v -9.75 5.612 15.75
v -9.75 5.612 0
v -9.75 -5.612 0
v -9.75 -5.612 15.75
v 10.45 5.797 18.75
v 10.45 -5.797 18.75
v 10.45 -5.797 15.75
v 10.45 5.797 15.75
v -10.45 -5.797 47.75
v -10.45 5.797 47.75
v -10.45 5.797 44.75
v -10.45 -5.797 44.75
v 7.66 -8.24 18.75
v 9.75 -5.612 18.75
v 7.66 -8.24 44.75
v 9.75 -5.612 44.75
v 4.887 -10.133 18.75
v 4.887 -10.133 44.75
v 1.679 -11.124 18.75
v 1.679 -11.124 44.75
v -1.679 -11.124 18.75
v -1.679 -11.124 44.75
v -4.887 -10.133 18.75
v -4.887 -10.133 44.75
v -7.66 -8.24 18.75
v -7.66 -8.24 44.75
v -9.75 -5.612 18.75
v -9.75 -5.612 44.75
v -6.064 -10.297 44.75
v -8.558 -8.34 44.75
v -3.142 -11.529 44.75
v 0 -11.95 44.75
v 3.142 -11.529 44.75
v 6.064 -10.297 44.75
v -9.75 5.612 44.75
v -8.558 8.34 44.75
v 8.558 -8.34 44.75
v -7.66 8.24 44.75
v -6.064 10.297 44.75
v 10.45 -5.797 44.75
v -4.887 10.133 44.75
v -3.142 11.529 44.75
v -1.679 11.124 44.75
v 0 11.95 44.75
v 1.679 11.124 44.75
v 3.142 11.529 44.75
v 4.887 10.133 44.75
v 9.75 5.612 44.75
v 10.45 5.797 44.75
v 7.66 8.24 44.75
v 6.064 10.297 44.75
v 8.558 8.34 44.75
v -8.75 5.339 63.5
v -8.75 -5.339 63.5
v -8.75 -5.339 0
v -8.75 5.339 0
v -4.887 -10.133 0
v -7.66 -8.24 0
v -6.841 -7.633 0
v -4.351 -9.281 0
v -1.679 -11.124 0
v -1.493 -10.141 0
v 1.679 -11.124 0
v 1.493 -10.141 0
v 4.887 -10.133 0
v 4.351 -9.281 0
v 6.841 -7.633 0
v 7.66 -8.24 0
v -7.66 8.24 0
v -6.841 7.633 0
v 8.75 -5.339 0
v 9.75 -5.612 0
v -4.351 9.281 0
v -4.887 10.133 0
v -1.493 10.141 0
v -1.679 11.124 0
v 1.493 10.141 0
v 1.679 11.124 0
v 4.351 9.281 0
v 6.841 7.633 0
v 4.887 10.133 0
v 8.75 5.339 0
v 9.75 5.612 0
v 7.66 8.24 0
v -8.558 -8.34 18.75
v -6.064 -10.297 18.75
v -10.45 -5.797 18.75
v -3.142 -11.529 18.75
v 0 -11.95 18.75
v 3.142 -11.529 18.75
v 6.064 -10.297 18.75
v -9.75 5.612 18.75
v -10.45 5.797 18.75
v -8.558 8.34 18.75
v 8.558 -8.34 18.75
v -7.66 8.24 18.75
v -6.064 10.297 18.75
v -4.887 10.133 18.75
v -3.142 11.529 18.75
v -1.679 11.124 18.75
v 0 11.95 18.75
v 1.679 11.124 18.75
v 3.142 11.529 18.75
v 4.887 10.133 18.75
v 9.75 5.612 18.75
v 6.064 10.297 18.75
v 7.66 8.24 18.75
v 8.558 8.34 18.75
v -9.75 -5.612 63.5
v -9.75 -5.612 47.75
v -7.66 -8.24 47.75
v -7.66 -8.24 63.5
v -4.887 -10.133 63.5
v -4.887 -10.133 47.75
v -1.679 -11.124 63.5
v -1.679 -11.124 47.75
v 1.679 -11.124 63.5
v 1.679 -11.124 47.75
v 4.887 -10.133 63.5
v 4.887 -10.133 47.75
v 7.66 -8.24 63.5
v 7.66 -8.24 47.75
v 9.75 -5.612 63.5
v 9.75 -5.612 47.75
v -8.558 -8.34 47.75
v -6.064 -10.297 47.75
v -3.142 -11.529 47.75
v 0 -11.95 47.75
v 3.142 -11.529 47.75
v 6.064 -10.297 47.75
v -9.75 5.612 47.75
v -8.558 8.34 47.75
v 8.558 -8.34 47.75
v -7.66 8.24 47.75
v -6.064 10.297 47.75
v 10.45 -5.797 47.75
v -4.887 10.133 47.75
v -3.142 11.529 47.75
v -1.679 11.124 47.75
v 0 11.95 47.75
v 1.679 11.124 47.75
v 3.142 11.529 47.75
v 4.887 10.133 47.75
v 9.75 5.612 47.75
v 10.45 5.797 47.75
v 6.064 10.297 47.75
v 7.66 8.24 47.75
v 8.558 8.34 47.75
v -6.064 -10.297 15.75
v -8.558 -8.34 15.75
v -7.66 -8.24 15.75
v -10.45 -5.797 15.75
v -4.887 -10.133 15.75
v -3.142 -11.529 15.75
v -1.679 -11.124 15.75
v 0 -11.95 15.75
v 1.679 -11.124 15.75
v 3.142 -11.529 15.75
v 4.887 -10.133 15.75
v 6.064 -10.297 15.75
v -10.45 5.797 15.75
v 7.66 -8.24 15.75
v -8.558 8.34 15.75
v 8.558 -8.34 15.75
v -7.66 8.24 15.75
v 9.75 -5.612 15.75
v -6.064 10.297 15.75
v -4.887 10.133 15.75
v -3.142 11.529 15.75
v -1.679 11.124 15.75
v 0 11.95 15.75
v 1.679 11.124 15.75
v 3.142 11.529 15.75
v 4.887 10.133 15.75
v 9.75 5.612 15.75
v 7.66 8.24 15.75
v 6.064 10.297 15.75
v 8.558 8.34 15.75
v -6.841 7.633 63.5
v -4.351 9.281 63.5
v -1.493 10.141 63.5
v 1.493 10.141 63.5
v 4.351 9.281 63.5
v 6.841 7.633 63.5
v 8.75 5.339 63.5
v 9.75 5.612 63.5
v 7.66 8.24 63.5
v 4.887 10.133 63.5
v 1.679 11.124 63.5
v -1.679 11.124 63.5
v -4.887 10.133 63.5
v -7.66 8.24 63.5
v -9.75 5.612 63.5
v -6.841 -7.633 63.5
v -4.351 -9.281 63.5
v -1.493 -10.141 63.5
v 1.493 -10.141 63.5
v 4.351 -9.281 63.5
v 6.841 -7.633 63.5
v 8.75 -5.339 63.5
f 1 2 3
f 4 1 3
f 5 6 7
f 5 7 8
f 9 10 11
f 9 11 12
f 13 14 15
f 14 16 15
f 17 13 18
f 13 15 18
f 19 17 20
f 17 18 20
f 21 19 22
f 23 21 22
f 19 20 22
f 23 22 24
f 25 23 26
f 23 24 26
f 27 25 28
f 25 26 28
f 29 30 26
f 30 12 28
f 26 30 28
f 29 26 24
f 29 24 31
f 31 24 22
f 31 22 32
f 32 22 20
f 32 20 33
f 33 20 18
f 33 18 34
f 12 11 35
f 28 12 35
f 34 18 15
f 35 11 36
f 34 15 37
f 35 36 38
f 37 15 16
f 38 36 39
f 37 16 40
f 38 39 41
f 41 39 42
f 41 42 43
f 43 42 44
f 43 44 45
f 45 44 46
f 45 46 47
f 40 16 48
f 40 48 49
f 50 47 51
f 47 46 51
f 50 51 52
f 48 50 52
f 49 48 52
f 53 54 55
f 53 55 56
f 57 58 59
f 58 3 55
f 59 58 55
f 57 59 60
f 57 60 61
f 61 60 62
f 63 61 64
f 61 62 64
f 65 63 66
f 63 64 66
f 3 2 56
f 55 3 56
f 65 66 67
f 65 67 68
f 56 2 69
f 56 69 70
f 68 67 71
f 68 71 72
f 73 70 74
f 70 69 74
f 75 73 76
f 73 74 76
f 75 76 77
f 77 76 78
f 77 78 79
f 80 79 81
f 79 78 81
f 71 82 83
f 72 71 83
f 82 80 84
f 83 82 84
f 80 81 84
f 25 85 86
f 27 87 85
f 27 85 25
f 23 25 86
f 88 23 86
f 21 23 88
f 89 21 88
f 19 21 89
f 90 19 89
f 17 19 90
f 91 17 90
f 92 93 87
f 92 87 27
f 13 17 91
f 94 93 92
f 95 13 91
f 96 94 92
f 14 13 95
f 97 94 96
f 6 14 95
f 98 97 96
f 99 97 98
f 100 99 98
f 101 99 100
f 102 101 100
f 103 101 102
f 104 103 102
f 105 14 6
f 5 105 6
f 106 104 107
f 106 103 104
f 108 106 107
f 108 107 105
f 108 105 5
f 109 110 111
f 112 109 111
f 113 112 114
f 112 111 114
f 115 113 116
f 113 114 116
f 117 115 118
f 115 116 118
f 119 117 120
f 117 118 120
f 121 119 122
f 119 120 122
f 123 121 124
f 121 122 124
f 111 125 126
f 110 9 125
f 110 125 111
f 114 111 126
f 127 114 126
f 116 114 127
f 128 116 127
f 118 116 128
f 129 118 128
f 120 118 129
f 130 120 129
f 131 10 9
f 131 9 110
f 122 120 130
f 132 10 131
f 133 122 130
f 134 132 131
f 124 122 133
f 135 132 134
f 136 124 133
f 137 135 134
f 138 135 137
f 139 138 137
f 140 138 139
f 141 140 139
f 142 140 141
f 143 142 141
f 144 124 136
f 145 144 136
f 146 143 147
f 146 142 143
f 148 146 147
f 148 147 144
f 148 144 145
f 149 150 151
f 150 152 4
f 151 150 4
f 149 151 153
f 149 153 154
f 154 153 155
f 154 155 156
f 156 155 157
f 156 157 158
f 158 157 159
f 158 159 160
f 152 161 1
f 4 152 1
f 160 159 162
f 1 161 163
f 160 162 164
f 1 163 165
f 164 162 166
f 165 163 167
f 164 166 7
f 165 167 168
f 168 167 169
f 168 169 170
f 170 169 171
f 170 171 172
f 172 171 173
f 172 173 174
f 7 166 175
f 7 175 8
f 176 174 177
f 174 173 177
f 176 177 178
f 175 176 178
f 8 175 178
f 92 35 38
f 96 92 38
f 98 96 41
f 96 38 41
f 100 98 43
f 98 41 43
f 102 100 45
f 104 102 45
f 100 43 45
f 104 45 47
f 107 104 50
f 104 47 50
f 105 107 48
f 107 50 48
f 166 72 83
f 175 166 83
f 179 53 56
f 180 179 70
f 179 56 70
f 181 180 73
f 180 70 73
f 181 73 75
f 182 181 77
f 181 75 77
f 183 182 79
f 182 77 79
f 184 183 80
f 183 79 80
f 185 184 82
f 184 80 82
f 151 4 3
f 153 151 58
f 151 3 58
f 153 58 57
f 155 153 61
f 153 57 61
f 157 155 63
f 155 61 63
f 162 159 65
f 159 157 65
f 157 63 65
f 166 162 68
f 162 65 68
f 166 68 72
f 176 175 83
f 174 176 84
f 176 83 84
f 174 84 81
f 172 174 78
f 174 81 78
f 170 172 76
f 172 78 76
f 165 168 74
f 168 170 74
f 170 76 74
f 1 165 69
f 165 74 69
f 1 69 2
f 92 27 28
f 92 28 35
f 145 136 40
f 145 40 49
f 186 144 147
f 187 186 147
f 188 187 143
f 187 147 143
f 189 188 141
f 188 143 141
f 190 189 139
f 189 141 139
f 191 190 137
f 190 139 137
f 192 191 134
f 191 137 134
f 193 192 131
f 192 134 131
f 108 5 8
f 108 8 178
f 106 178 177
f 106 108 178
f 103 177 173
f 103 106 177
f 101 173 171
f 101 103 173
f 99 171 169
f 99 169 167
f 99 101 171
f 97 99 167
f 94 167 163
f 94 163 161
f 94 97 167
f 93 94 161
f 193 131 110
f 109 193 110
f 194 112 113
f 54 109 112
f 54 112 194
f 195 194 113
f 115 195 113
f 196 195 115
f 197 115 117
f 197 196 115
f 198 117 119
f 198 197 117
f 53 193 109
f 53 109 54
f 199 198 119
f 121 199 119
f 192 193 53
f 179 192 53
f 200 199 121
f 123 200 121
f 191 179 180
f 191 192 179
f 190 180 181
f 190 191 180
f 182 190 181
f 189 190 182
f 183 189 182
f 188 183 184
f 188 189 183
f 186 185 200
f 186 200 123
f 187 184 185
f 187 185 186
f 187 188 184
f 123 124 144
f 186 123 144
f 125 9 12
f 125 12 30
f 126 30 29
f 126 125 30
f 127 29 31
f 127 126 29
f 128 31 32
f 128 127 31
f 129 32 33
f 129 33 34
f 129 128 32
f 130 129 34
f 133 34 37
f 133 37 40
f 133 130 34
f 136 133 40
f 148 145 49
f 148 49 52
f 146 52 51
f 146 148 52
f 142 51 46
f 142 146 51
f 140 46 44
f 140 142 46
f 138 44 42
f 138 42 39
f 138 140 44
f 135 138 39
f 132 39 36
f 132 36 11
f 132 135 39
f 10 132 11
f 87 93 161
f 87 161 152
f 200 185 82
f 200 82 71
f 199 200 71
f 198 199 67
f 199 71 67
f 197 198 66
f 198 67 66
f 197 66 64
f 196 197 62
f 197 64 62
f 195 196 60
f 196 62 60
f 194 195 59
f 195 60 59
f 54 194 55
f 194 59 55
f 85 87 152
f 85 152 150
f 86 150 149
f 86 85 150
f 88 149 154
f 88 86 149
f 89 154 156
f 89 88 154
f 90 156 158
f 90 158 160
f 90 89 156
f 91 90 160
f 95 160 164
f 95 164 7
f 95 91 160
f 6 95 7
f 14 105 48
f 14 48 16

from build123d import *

# Parameters (mm, degrees)
F1_DEPTH = 63.5
F4_DEPTH = 16
F5_DEPTH = 13


with BuildPart() as f1:
    # F0 (on Top) → F1 (new body)
    with BuildSketch(Plane.XY):
        with BuildLine():
            Line((-9.75, 5.612486), (-9.75, -5.612486))
            ThreePointArc((-9.75, -5.612486), (0, -11.25), (9.75, -5.612486))
            Line((9.75, -5.612486), (9.75, 5.612486))
            ThreePointArc((9.75, 5.612486), (0, 11.25), (-9.75, 5.612486))
        make_face()
        with BuildLine():
            ThreePointArc((8.75, -5.338539), (0, -10.25), (-8.75, -5.338539))
            Line((-8.75, -5.338539), (-8.75, 5.338539))
            ThreePointArc((-8.75, 5.338539), (0, 10.25), (8.75, 5.338539))
            Line((8.75, 5.338539), (8.75, -5.338539))
        make_face(mode=Mode.SUBTRACT)
    extrude(amount=F1_DEPTH)

    # F3 (on mid) → F4 (join, symmetric)
    with BuildSketch(Plane.XY.offset(31.75)):
        with BuildLine():
            Line((10.45, -5.796551), (10.45, 5.796551))
            ThreePointArc((10.45, 5.796551), (0, 11.95), (-10.45, 5.796551))
            Line((-10.45, 5.796551), (-10.45, -5.796551))
            ThreePointArc((-10.45, -5.796551), (0, -11.95), (10.45, -5.796551))
        make_face()
        with BuildLine():
            ThreePointArc((-9.75, 5.612486), (0, 11.25), (9.75, 5.612486))
            Line((9.75, 5.612486), (9.75, -5.612486))
            ThreePointArc((9.75, -5.612486), (0, -11.25), (-9.75, -5.612486))
            Line((-9.75, -5.612486), (-9.75, 5.612486))
        make_face(mode=Mode.SUBTRACT)
    extrude(amount=F4_DEPTH, both=True)

    # F3 (on mid) → F5 (cut, symmetric)
    with BuildSketch(Plane.XY.offset(31.75)):
        with BuildLine():
            Line((10.45, -5.796551), (10.45, 5.796551))
            ThreePointArc((10.45, 5.796551), (0, 11.95), (-10.45, 5.796551))
            Line((-10.45, 5.796551), (-10.45, -5.796551))
            ThreePointArc((-10.45, -5.796551), (0, -11.95), (10.45, -5.796551))
        make_face()
        with BuildLine():
            ThreePointArc((-9.75, 5.612486), (0, 11.25), (9.75, 5.612486))
            Line((9.75, 5.612486), (9.75, -5.612486))
            ThreePointArc((9.75, -5.612486), (0, -11.25), (-9.75, -5.612486))
            Line((-9.75, -5.612486), (-9.75, 5.612486))
        make_face(mode=Mode.SUBTRACT)
    extrude(amount=F5_DEPTH, both=True, mode=Mode.SUBTRACT)


solid = f1.part
